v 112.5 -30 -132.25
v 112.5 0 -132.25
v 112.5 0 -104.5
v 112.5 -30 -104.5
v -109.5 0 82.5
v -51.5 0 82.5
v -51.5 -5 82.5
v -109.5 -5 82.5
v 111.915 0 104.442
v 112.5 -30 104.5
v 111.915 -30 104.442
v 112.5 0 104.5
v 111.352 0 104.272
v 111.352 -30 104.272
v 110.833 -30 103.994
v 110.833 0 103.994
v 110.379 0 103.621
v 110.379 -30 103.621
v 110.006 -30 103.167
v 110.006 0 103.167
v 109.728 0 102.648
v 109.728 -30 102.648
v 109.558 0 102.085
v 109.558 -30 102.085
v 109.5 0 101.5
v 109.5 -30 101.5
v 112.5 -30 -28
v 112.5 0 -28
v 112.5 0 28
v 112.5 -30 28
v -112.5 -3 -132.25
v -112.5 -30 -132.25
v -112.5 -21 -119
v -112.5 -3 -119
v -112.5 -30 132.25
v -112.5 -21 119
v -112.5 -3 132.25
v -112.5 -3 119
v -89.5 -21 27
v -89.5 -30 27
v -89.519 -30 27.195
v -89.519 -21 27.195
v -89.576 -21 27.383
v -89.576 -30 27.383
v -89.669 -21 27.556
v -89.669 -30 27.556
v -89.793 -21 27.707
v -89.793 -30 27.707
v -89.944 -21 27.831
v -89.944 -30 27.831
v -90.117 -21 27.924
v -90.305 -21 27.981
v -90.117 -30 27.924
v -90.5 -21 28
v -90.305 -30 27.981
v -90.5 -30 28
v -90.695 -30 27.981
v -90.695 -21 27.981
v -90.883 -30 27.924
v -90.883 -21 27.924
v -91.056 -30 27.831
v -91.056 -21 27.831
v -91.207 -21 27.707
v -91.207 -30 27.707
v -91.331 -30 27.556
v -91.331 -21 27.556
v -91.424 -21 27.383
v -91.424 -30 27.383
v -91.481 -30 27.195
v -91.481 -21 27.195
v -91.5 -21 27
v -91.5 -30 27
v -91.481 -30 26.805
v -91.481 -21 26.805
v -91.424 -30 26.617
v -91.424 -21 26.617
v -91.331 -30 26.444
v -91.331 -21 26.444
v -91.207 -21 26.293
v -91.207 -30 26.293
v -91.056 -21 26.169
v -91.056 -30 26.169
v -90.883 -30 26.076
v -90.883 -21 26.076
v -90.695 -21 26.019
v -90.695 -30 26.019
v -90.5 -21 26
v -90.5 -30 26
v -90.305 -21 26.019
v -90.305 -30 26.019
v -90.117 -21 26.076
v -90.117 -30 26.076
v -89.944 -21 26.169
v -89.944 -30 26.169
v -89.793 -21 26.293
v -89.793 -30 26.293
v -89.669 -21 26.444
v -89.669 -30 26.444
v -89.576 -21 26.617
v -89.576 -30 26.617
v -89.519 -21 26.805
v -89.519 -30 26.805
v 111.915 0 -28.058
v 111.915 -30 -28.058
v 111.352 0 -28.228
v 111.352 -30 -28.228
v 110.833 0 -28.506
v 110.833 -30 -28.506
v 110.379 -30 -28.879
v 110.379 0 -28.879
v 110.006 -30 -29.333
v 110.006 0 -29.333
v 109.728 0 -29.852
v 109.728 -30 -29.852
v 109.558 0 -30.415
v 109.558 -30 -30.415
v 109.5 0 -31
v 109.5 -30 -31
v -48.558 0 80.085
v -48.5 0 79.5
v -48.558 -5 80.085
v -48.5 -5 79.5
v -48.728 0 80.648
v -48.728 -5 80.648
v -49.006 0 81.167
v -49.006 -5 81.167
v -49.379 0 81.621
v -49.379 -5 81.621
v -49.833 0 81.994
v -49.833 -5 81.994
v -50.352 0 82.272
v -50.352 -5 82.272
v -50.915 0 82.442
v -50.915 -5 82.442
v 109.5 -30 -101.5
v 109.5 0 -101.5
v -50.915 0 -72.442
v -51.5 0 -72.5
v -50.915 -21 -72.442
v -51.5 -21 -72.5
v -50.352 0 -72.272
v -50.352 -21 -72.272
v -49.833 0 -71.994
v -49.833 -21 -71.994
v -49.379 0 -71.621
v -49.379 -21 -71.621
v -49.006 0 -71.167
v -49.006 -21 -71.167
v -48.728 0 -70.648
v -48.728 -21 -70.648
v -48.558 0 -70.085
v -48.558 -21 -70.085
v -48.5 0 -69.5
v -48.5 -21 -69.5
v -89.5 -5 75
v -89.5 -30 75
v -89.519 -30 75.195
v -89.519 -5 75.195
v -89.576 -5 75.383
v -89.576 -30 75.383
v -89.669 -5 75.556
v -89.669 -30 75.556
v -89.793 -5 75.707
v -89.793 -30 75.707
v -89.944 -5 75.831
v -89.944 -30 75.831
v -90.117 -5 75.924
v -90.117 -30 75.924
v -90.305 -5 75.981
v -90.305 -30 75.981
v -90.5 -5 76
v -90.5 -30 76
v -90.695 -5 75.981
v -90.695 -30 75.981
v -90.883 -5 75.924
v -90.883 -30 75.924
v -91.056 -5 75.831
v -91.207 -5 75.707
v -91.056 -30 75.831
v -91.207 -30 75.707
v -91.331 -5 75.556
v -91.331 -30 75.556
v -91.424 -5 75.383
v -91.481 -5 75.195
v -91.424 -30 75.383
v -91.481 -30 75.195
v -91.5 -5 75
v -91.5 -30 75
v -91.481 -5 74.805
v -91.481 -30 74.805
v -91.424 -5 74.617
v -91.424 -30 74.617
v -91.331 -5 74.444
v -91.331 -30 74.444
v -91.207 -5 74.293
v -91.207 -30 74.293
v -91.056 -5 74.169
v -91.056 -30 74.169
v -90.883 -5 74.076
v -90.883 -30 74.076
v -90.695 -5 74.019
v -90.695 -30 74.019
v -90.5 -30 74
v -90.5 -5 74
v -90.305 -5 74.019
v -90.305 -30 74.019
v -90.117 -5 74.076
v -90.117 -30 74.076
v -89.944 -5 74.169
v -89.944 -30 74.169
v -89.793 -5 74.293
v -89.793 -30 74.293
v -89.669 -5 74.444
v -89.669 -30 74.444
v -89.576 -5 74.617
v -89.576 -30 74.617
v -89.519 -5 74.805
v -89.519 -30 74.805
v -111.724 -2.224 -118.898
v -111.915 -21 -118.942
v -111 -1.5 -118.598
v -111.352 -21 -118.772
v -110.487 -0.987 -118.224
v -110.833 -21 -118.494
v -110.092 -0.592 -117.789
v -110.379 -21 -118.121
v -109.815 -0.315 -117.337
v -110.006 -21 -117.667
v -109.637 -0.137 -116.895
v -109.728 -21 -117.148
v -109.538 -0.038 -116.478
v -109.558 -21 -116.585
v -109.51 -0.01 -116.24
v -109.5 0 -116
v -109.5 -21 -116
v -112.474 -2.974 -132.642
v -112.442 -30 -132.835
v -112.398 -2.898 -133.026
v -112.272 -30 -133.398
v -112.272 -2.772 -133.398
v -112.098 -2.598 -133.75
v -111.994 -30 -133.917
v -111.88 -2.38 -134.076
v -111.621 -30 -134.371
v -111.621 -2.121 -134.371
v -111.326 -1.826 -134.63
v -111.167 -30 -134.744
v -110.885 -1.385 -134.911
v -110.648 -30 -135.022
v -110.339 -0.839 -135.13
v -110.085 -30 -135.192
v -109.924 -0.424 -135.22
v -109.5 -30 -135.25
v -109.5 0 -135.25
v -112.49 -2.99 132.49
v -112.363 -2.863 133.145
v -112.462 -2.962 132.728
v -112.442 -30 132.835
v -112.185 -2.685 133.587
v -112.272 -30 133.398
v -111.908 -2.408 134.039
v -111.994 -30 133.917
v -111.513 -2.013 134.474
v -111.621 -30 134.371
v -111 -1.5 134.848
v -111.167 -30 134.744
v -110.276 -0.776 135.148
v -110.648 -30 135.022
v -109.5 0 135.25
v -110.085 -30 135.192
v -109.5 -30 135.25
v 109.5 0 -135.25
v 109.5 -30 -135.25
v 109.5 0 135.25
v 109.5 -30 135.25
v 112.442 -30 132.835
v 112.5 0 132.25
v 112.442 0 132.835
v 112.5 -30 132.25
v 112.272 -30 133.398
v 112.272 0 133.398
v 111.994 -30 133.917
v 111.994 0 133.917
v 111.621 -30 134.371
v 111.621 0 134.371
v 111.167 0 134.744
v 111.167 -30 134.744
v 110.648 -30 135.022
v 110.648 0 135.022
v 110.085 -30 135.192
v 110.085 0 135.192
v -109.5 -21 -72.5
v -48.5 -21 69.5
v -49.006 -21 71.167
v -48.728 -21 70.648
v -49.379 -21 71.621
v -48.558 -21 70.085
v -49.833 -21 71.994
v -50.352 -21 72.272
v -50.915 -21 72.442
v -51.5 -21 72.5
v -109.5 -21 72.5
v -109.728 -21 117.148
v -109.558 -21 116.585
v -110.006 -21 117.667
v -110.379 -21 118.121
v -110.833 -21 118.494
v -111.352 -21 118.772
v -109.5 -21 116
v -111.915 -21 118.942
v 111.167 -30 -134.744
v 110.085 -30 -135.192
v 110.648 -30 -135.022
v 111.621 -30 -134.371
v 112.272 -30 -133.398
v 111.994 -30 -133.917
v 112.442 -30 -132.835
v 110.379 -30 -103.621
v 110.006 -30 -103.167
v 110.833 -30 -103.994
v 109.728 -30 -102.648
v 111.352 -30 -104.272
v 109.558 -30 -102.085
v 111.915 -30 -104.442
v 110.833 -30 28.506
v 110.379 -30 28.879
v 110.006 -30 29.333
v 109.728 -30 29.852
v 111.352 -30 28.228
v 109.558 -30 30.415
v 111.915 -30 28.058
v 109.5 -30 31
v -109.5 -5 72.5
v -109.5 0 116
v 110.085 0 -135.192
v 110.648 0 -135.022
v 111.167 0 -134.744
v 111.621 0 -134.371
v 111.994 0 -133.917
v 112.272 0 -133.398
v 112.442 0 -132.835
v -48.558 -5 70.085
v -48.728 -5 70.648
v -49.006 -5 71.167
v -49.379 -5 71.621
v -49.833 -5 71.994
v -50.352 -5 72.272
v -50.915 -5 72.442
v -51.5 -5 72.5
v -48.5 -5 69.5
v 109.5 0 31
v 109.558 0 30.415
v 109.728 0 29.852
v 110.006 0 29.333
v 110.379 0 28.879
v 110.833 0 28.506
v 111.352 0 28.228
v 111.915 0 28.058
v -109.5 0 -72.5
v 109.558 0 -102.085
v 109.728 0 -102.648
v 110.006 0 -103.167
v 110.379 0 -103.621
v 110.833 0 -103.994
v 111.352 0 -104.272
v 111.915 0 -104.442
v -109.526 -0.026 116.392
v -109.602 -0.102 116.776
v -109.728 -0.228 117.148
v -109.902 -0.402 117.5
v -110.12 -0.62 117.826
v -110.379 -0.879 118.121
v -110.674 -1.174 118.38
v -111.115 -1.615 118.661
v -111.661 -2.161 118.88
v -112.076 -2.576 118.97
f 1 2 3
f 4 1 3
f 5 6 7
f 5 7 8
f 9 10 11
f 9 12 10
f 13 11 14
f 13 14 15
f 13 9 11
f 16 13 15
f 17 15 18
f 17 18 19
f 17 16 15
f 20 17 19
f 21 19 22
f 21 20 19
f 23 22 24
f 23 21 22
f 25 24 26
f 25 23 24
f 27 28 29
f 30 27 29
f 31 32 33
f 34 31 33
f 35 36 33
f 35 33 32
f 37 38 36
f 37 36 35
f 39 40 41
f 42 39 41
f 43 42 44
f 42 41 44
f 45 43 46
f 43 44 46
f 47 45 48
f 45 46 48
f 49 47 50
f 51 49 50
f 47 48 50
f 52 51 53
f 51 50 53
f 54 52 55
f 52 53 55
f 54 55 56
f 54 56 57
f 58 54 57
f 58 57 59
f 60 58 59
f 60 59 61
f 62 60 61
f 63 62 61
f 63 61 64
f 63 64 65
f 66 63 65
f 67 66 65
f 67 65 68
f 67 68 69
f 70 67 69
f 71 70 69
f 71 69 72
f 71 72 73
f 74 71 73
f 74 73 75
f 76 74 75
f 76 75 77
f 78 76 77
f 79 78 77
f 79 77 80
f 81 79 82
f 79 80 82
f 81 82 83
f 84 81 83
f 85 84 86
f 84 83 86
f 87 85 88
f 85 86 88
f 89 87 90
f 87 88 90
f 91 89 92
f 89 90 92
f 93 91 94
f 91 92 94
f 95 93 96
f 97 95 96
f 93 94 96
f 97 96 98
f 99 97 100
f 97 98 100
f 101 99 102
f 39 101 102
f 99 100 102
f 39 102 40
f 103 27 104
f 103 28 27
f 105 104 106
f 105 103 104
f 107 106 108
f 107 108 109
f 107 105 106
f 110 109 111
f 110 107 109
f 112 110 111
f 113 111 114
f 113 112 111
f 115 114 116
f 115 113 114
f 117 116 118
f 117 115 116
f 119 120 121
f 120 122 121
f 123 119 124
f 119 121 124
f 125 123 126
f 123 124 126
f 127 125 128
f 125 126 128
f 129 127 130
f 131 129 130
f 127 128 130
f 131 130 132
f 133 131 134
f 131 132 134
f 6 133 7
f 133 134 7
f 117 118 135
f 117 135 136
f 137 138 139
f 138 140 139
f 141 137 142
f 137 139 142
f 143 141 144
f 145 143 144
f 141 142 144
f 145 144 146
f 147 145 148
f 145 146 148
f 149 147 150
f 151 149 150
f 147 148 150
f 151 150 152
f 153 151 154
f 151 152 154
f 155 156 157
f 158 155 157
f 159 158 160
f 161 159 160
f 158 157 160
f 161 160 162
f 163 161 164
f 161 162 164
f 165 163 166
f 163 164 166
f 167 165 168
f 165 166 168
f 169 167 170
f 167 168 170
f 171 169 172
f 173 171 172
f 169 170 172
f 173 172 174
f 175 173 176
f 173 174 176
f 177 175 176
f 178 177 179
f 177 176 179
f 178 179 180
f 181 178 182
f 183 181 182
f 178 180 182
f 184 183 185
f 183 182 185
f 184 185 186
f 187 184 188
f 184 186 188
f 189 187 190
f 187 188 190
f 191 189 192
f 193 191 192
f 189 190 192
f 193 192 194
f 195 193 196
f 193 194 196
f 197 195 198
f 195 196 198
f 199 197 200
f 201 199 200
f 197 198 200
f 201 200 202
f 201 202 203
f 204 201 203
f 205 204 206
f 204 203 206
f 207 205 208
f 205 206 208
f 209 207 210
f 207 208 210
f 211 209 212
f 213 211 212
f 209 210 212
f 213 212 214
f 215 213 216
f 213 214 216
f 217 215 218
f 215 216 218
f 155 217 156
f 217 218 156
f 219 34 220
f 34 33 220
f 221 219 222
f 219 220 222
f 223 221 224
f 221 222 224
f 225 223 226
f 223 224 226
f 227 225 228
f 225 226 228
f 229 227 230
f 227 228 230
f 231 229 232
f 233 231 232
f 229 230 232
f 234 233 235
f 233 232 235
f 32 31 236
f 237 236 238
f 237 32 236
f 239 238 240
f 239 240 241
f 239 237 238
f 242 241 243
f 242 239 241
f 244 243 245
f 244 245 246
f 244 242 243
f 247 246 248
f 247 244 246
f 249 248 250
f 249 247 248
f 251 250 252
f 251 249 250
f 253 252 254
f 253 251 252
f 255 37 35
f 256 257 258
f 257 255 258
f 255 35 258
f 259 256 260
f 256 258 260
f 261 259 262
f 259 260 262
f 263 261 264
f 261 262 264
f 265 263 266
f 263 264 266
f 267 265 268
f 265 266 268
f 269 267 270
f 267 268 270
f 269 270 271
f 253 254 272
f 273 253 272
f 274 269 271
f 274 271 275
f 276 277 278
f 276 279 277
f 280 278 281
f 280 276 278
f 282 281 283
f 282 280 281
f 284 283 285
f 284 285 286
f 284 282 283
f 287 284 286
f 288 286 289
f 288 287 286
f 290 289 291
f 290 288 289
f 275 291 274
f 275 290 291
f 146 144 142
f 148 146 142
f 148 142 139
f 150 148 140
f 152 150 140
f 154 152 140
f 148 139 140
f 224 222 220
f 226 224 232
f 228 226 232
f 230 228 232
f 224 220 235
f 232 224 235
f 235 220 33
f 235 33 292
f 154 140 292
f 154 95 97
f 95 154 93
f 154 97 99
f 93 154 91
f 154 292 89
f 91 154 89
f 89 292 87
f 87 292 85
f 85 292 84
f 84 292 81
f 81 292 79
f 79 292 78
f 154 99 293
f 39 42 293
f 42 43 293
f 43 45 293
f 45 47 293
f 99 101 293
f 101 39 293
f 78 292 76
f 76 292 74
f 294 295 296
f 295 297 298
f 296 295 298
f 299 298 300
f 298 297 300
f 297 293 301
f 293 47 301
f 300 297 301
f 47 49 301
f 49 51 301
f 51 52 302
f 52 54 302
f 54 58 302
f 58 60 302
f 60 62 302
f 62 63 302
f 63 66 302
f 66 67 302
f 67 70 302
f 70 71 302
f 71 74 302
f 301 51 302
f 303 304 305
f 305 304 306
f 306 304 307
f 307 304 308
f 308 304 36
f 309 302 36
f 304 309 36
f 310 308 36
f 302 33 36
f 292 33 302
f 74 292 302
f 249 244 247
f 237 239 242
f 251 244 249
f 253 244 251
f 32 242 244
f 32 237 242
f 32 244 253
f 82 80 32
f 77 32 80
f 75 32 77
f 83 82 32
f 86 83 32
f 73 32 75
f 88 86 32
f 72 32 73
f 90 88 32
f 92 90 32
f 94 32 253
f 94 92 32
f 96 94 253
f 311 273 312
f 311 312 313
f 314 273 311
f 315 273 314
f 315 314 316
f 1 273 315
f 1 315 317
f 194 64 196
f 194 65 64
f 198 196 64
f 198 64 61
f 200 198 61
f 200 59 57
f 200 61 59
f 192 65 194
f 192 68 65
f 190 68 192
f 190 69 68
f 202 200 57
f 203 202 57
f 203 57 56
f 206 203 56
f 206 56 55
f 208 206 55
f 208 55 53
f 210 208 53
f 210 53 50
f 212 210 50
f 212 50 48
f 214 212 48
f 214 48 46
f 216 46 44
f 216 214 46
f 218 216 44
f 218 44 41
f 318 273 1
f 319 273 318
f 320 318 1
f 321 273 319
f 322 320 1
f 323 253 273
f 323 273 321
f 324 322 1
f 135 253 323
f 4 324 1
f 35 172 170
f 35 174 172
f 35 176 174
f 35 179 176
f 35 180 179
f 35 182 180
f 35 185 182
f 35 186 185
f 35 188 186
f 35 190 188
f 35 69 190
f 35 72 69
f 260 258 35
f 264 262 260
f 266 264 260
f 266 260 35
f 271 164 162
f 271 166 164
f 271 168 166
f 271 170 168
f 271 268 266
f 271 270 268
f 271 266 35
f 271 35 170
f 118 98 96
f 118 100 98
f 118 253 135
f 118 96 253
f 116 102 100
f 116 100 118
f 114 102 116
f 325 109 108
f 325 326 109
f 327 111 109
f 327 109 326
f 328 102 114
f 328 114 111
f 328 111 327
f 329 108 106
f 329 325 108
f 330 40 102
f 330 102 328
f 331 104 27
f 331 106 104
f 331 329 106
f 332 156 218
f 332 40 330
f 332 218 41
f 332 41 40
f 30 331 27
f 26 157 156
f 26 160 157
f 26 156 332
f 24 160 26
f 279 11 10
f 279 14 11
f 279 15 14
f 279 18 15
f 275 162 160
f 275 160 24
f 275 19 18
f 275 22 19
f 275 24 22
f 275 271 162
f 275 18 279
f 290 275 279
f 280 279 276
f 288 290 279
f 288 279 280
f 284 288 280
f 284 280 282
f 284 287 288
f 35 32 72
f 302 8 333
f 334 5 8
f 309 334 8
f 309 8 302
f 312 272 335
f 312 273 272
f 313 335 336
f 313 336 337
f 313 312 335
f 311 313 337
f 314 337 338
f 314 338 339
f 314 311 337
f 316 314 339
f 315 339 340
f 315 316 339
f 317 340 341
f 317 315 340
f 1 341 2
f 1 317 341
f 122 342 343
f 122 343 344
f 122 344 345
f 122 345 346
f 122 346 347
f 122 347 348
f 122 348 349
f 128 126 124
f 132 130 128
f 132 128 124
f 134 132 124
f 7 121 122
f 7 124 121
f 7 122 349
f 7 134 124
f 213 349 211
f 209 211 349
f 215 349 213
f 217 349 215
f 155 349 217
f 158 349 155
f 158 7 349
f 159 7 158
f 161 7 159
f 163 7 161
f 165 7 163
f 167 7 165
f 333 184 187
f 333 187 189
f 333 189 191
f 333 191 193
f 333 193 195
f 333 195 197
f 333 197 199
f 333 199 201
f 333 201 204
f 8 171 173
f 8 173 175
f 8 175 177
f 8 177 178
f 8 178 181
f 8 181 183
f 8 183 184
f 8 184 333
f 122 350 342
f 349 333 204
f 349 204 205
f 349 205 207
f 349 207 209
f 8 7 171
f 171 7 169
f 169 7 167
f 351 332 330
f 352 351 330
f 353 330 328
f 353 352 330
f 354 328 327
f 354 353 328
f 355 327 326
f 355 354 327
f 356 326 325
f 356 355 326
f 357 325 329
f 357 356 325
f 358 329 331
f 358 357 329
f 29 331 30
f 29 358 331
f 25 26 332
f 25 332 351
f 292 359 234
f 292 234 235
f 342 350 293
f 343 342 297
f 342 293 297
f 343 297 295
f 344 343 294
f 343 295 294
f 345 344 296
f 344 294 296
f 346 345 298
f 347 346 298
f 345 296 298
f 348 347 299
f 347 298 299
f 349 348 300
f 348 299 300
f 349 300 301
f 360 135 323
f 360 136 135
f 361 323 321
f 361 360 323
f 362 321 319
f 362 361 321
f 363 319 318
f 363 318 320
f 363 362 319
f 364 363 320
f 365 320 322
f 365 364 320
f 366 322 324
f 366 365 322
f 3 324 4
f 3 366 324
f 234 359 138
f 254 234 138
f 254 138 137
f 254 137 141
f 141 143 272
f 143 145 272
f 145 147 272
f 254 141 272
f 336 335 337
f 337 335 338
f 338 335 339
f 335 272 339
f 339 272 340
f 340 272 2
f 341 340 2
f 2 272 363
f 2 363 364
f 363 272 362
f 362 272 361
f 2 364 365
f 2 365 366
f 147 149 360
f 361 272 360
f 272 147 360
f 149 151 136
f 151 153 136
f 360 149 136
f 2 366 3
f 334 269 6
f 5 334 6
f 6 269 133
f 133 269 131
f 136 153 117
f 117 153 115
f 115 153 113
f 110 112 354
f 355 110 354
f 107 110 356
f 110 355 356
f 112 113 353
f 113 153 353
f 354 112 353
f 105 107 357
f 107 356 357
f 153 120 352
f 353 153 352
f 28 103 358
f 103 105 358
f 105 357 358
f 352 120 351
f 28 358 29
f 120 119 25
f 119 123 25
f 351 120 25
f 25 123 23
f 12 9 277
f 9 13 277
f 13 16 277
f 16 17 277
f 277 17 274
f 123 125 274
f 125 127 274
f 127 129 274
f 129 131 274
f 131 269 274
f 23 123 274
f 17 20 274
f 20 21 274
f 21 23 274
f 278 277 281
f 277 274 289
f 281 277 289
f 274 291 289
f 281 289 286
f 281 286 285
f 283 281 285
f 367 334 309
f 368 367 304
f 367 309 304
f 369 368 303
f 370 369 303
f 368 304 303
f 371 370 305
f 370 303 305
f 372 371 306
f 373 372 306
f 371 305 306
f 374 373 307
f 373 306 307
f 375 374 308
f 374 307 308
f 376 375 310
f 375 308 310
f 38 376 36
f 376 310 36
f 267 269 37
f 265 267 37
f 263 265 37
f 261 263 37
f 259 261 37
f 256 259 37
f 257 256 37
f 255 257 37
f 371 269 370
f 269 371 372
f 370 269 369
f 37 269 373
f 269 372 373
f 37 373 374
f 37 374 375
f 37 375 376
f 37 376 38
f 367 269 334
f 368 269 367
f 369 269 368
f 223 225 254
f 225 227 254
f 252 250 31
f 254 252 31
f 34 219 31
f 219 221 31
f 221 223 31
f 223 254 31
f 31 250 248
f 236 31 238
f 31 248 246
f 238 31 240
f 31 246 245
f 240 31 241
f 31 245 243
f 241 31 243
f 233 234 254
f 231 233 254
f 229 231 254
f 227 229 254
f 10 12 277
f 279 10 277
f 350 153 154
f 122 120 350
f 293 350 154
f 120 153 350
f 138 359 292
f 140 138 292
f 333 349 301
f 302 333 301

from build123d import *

# Parameters (mm, degrees)
F0_W          = 225
F0_H          = 270.5
F1_DEPTH      = 30
F2_R          = 3
F3_W          = 30
F3_H          = 76.5
F4_DEPTH      = 3
F5_R          = 2.99999
F6_W          = 21
F6_H          = 238
F7_DEPTH      = 3
F8_R          = 2.99999
F9_W          = 21
F9_H          = 145
F10_DEPTH     = 61
F11_R         = 3
F12_T1_DEPTH  = 28.6800979278
F12_T3_DEPTH  = 28.6800979278
F12_T8_DEPTH  = 15.4301079278
F12_T13_DEPTH = 15.4301079278
F13_W         = 61
F13_H         = 13
F14_DEPTH     = 5
F15_R         = 3
F16_R         = 1
F17_DEPTH     = 25


# Not quite as in the source:
# - a fillet or chamfer that OpenCascade refuses, or shapes differently, is made with other operations: its cross-section is extruded or revolved along the edge and cut away or added
# - a fillet or chamfer is up to 0.001 mm smaller than in the source, because OpenCascade refuses the exact size


with BuildPart() as f1:
    # F0 (on Front) → F1 (new body)
    with BuildSketch(Plane.XZ):
        Rectangle(F0_W, F0_H)
    extrude(amount=F1_DEPTH)

    # F2
    f2_edges = [f1.edges().sort_by_distance(p)[0] for p in [
        (112.5, -15, 135.25),
        (112.5, -15, -135.25),
        (-112.5, -15, 135.25),
        (-112.5, -15, -135.25),
    ]]
    fillet(f2_edges, radius=F2_R)

    # F3 (on face) → F4 (cut)
    with BuildSketch(Plane.YZ.offset(112.5)):
        with Locations((-15, 66.25)):
            Rectangle(F3_W, F3_H)
        with Locations((-15, -66.25)):
            Rectangle(F3_W, F3_H)
    extrude(amount=-F4_DEPTH, mode=Mode.SUBTRACT)

    # F5 (radius 3 in the source; OpenCascade refuses exactly that, so slightly less here)
    f5_edges = [f1.edges().sort_by_distance(p)[0] for p in [
        (109.5, -15, 28),
        (109.5, -15, -104.5),
        (109.5, -15, -28),
        (109.5, -15, 104.5),
    ]]
    fillet(f5_edges, radius=F5_R)

    # F6 (on face) → F7 (cut)
    with BuildSketch(Plane(origin=(-112.5, 0, 0), x_dir=(0, -1, 0), z_dir=(-1, 0, 0))):
        with Locations((10.5, 0)):
            Rectangle(F6_W, F6_H)
    extrude(amount=-F7_DEPTH, mode=Mode.SUBTRACT)

    # F8 (radius 3 in the source; OpenCascade refuses exactly that, so slightly less here)
    f8_edges = [f1.edges().sort_by_distance(p)[0] for p in [
        (-109.5, -10.5, -119),
        (-109.5, -10.5, 119),
    ]]
    fillet(f8_edges, radius=F8_R)

    # F9 (on face) → F10 (cut)
    with BuildSketch(Plane(origin=(-109.5, 0, 0), x_dir=(0, -1, 0), z_dir=(-1, 0, 0))):
        with Locations((10.5, 0)):
            Rectangle(F9_W, F9_H)
    extrude(amount=-F10_DEPTH, mode=Mode.SUBTRACT)

    # F11
    f11_edges = [f1.edges().sort_by_distance(p)[0] for p in [
        (-48.5, -10.5, -72.5),
        (-48.5, -10.5, 72.5),
    ]]
    fillet(f11_edges, radius=F11_R)

    # F12: chamfer of 3 on 6 edges, made by hand

    # F12_s2 → F12_t1 (cut)
    with BuildSketch(Plane.XY.offset(-139.9650489639)):
        Polygon((-109.5, 0), (-112.5, -3), (-112.5, 0), align=None)
    extrude(amount=F12_T1_DEPTH, mode=Mode.SUBTRACT)

    # F12_s4 → F12_t3 (cut)
    with BuildSketch(Plane.XY.offset(111.2849510361)):
        Polygon((-109.5, 0), (-112.5, -3), (-112.5, 0), align=None)
    extrude(amount=F12_T3_DEPTH, mode=Mode.SUBTRACT)


with BuildPart() as f12_tool6:
    # F12_s7 → F12_t8 (new body)
    with BuildSketch(Plane.YZ.offset(-120.2150489639)):
        Polygon((0, -122), (-3, -119), (0, -119), align=None)
    extrude(amount=F12_T8_DEPTH)

    split(bisect_by=Plane(origin=(-54.75, 54.75, 0), x_dir=(0, 0, 1), z_dir=(-0.7071067812, 0.7071067812, 0)), keep=Keep.TOP)


with BuildPart() as f1_1:
    add(f1.part)

    # F12_t5: cut F12_tool6
    add(f12_tool6.part, mode=Mode.SUBTRACT)


with BuildPart() as f12_tool11:
    # F12_s12 → F12_t13 (new body)
    with BuildSketch(Plane.YZ.offset(-120.2150489639)):
        Polygon((0, 122), (-3, 119), (0, 119), align=None)
    extrude(amount=F12_T13_DEPTH)

    split(bisect_by=Plane(origin=(-54.75, 54.75, 0), x_dir=(0, 0, 1), z_dir=(-0.7071067812, 0.7071067812, 0)), keep=Keep.TOP)


with BuildPart() as f1_2:
    add(f1_1.part)

    # F12_t10: cut F12_tool11
    add(f12_tool11.part, mode=Mode.SUBTRACT)

    # F13 (on face) → F14 (cut)
    with BuildSketch(Plane(origin=(0, 0, 0), x_dir=(-1, 0, 0), z_dir=(0, 1, 0))):
        with Locations((79, 76)):
            Rectangle(F13_W, F13_H)
    extrude(amount=-F14_DEPTH, mode=Mode.SUBTRACT)

    # F15
    f15_edges = [f1_2.edges().sort_by_distance(p)[0] for p in [
        (-48.5, -2.5, 82.5),
    ]]
    fillet(f15_edges, radius=F15_R)

    # F16 (on face) → F17 (cut)
    with BuildSketch(Plane.XZ.offset(30)):
        with Locations((-90.5, 75)):
            Circle(F16_R)
        with Locations((-90.5, 27)):
            Circle(F16_R)
    extrude(amount=-F17_DEPTH, mode=Mode.SUBTRACT)


solid = f1_2.part
